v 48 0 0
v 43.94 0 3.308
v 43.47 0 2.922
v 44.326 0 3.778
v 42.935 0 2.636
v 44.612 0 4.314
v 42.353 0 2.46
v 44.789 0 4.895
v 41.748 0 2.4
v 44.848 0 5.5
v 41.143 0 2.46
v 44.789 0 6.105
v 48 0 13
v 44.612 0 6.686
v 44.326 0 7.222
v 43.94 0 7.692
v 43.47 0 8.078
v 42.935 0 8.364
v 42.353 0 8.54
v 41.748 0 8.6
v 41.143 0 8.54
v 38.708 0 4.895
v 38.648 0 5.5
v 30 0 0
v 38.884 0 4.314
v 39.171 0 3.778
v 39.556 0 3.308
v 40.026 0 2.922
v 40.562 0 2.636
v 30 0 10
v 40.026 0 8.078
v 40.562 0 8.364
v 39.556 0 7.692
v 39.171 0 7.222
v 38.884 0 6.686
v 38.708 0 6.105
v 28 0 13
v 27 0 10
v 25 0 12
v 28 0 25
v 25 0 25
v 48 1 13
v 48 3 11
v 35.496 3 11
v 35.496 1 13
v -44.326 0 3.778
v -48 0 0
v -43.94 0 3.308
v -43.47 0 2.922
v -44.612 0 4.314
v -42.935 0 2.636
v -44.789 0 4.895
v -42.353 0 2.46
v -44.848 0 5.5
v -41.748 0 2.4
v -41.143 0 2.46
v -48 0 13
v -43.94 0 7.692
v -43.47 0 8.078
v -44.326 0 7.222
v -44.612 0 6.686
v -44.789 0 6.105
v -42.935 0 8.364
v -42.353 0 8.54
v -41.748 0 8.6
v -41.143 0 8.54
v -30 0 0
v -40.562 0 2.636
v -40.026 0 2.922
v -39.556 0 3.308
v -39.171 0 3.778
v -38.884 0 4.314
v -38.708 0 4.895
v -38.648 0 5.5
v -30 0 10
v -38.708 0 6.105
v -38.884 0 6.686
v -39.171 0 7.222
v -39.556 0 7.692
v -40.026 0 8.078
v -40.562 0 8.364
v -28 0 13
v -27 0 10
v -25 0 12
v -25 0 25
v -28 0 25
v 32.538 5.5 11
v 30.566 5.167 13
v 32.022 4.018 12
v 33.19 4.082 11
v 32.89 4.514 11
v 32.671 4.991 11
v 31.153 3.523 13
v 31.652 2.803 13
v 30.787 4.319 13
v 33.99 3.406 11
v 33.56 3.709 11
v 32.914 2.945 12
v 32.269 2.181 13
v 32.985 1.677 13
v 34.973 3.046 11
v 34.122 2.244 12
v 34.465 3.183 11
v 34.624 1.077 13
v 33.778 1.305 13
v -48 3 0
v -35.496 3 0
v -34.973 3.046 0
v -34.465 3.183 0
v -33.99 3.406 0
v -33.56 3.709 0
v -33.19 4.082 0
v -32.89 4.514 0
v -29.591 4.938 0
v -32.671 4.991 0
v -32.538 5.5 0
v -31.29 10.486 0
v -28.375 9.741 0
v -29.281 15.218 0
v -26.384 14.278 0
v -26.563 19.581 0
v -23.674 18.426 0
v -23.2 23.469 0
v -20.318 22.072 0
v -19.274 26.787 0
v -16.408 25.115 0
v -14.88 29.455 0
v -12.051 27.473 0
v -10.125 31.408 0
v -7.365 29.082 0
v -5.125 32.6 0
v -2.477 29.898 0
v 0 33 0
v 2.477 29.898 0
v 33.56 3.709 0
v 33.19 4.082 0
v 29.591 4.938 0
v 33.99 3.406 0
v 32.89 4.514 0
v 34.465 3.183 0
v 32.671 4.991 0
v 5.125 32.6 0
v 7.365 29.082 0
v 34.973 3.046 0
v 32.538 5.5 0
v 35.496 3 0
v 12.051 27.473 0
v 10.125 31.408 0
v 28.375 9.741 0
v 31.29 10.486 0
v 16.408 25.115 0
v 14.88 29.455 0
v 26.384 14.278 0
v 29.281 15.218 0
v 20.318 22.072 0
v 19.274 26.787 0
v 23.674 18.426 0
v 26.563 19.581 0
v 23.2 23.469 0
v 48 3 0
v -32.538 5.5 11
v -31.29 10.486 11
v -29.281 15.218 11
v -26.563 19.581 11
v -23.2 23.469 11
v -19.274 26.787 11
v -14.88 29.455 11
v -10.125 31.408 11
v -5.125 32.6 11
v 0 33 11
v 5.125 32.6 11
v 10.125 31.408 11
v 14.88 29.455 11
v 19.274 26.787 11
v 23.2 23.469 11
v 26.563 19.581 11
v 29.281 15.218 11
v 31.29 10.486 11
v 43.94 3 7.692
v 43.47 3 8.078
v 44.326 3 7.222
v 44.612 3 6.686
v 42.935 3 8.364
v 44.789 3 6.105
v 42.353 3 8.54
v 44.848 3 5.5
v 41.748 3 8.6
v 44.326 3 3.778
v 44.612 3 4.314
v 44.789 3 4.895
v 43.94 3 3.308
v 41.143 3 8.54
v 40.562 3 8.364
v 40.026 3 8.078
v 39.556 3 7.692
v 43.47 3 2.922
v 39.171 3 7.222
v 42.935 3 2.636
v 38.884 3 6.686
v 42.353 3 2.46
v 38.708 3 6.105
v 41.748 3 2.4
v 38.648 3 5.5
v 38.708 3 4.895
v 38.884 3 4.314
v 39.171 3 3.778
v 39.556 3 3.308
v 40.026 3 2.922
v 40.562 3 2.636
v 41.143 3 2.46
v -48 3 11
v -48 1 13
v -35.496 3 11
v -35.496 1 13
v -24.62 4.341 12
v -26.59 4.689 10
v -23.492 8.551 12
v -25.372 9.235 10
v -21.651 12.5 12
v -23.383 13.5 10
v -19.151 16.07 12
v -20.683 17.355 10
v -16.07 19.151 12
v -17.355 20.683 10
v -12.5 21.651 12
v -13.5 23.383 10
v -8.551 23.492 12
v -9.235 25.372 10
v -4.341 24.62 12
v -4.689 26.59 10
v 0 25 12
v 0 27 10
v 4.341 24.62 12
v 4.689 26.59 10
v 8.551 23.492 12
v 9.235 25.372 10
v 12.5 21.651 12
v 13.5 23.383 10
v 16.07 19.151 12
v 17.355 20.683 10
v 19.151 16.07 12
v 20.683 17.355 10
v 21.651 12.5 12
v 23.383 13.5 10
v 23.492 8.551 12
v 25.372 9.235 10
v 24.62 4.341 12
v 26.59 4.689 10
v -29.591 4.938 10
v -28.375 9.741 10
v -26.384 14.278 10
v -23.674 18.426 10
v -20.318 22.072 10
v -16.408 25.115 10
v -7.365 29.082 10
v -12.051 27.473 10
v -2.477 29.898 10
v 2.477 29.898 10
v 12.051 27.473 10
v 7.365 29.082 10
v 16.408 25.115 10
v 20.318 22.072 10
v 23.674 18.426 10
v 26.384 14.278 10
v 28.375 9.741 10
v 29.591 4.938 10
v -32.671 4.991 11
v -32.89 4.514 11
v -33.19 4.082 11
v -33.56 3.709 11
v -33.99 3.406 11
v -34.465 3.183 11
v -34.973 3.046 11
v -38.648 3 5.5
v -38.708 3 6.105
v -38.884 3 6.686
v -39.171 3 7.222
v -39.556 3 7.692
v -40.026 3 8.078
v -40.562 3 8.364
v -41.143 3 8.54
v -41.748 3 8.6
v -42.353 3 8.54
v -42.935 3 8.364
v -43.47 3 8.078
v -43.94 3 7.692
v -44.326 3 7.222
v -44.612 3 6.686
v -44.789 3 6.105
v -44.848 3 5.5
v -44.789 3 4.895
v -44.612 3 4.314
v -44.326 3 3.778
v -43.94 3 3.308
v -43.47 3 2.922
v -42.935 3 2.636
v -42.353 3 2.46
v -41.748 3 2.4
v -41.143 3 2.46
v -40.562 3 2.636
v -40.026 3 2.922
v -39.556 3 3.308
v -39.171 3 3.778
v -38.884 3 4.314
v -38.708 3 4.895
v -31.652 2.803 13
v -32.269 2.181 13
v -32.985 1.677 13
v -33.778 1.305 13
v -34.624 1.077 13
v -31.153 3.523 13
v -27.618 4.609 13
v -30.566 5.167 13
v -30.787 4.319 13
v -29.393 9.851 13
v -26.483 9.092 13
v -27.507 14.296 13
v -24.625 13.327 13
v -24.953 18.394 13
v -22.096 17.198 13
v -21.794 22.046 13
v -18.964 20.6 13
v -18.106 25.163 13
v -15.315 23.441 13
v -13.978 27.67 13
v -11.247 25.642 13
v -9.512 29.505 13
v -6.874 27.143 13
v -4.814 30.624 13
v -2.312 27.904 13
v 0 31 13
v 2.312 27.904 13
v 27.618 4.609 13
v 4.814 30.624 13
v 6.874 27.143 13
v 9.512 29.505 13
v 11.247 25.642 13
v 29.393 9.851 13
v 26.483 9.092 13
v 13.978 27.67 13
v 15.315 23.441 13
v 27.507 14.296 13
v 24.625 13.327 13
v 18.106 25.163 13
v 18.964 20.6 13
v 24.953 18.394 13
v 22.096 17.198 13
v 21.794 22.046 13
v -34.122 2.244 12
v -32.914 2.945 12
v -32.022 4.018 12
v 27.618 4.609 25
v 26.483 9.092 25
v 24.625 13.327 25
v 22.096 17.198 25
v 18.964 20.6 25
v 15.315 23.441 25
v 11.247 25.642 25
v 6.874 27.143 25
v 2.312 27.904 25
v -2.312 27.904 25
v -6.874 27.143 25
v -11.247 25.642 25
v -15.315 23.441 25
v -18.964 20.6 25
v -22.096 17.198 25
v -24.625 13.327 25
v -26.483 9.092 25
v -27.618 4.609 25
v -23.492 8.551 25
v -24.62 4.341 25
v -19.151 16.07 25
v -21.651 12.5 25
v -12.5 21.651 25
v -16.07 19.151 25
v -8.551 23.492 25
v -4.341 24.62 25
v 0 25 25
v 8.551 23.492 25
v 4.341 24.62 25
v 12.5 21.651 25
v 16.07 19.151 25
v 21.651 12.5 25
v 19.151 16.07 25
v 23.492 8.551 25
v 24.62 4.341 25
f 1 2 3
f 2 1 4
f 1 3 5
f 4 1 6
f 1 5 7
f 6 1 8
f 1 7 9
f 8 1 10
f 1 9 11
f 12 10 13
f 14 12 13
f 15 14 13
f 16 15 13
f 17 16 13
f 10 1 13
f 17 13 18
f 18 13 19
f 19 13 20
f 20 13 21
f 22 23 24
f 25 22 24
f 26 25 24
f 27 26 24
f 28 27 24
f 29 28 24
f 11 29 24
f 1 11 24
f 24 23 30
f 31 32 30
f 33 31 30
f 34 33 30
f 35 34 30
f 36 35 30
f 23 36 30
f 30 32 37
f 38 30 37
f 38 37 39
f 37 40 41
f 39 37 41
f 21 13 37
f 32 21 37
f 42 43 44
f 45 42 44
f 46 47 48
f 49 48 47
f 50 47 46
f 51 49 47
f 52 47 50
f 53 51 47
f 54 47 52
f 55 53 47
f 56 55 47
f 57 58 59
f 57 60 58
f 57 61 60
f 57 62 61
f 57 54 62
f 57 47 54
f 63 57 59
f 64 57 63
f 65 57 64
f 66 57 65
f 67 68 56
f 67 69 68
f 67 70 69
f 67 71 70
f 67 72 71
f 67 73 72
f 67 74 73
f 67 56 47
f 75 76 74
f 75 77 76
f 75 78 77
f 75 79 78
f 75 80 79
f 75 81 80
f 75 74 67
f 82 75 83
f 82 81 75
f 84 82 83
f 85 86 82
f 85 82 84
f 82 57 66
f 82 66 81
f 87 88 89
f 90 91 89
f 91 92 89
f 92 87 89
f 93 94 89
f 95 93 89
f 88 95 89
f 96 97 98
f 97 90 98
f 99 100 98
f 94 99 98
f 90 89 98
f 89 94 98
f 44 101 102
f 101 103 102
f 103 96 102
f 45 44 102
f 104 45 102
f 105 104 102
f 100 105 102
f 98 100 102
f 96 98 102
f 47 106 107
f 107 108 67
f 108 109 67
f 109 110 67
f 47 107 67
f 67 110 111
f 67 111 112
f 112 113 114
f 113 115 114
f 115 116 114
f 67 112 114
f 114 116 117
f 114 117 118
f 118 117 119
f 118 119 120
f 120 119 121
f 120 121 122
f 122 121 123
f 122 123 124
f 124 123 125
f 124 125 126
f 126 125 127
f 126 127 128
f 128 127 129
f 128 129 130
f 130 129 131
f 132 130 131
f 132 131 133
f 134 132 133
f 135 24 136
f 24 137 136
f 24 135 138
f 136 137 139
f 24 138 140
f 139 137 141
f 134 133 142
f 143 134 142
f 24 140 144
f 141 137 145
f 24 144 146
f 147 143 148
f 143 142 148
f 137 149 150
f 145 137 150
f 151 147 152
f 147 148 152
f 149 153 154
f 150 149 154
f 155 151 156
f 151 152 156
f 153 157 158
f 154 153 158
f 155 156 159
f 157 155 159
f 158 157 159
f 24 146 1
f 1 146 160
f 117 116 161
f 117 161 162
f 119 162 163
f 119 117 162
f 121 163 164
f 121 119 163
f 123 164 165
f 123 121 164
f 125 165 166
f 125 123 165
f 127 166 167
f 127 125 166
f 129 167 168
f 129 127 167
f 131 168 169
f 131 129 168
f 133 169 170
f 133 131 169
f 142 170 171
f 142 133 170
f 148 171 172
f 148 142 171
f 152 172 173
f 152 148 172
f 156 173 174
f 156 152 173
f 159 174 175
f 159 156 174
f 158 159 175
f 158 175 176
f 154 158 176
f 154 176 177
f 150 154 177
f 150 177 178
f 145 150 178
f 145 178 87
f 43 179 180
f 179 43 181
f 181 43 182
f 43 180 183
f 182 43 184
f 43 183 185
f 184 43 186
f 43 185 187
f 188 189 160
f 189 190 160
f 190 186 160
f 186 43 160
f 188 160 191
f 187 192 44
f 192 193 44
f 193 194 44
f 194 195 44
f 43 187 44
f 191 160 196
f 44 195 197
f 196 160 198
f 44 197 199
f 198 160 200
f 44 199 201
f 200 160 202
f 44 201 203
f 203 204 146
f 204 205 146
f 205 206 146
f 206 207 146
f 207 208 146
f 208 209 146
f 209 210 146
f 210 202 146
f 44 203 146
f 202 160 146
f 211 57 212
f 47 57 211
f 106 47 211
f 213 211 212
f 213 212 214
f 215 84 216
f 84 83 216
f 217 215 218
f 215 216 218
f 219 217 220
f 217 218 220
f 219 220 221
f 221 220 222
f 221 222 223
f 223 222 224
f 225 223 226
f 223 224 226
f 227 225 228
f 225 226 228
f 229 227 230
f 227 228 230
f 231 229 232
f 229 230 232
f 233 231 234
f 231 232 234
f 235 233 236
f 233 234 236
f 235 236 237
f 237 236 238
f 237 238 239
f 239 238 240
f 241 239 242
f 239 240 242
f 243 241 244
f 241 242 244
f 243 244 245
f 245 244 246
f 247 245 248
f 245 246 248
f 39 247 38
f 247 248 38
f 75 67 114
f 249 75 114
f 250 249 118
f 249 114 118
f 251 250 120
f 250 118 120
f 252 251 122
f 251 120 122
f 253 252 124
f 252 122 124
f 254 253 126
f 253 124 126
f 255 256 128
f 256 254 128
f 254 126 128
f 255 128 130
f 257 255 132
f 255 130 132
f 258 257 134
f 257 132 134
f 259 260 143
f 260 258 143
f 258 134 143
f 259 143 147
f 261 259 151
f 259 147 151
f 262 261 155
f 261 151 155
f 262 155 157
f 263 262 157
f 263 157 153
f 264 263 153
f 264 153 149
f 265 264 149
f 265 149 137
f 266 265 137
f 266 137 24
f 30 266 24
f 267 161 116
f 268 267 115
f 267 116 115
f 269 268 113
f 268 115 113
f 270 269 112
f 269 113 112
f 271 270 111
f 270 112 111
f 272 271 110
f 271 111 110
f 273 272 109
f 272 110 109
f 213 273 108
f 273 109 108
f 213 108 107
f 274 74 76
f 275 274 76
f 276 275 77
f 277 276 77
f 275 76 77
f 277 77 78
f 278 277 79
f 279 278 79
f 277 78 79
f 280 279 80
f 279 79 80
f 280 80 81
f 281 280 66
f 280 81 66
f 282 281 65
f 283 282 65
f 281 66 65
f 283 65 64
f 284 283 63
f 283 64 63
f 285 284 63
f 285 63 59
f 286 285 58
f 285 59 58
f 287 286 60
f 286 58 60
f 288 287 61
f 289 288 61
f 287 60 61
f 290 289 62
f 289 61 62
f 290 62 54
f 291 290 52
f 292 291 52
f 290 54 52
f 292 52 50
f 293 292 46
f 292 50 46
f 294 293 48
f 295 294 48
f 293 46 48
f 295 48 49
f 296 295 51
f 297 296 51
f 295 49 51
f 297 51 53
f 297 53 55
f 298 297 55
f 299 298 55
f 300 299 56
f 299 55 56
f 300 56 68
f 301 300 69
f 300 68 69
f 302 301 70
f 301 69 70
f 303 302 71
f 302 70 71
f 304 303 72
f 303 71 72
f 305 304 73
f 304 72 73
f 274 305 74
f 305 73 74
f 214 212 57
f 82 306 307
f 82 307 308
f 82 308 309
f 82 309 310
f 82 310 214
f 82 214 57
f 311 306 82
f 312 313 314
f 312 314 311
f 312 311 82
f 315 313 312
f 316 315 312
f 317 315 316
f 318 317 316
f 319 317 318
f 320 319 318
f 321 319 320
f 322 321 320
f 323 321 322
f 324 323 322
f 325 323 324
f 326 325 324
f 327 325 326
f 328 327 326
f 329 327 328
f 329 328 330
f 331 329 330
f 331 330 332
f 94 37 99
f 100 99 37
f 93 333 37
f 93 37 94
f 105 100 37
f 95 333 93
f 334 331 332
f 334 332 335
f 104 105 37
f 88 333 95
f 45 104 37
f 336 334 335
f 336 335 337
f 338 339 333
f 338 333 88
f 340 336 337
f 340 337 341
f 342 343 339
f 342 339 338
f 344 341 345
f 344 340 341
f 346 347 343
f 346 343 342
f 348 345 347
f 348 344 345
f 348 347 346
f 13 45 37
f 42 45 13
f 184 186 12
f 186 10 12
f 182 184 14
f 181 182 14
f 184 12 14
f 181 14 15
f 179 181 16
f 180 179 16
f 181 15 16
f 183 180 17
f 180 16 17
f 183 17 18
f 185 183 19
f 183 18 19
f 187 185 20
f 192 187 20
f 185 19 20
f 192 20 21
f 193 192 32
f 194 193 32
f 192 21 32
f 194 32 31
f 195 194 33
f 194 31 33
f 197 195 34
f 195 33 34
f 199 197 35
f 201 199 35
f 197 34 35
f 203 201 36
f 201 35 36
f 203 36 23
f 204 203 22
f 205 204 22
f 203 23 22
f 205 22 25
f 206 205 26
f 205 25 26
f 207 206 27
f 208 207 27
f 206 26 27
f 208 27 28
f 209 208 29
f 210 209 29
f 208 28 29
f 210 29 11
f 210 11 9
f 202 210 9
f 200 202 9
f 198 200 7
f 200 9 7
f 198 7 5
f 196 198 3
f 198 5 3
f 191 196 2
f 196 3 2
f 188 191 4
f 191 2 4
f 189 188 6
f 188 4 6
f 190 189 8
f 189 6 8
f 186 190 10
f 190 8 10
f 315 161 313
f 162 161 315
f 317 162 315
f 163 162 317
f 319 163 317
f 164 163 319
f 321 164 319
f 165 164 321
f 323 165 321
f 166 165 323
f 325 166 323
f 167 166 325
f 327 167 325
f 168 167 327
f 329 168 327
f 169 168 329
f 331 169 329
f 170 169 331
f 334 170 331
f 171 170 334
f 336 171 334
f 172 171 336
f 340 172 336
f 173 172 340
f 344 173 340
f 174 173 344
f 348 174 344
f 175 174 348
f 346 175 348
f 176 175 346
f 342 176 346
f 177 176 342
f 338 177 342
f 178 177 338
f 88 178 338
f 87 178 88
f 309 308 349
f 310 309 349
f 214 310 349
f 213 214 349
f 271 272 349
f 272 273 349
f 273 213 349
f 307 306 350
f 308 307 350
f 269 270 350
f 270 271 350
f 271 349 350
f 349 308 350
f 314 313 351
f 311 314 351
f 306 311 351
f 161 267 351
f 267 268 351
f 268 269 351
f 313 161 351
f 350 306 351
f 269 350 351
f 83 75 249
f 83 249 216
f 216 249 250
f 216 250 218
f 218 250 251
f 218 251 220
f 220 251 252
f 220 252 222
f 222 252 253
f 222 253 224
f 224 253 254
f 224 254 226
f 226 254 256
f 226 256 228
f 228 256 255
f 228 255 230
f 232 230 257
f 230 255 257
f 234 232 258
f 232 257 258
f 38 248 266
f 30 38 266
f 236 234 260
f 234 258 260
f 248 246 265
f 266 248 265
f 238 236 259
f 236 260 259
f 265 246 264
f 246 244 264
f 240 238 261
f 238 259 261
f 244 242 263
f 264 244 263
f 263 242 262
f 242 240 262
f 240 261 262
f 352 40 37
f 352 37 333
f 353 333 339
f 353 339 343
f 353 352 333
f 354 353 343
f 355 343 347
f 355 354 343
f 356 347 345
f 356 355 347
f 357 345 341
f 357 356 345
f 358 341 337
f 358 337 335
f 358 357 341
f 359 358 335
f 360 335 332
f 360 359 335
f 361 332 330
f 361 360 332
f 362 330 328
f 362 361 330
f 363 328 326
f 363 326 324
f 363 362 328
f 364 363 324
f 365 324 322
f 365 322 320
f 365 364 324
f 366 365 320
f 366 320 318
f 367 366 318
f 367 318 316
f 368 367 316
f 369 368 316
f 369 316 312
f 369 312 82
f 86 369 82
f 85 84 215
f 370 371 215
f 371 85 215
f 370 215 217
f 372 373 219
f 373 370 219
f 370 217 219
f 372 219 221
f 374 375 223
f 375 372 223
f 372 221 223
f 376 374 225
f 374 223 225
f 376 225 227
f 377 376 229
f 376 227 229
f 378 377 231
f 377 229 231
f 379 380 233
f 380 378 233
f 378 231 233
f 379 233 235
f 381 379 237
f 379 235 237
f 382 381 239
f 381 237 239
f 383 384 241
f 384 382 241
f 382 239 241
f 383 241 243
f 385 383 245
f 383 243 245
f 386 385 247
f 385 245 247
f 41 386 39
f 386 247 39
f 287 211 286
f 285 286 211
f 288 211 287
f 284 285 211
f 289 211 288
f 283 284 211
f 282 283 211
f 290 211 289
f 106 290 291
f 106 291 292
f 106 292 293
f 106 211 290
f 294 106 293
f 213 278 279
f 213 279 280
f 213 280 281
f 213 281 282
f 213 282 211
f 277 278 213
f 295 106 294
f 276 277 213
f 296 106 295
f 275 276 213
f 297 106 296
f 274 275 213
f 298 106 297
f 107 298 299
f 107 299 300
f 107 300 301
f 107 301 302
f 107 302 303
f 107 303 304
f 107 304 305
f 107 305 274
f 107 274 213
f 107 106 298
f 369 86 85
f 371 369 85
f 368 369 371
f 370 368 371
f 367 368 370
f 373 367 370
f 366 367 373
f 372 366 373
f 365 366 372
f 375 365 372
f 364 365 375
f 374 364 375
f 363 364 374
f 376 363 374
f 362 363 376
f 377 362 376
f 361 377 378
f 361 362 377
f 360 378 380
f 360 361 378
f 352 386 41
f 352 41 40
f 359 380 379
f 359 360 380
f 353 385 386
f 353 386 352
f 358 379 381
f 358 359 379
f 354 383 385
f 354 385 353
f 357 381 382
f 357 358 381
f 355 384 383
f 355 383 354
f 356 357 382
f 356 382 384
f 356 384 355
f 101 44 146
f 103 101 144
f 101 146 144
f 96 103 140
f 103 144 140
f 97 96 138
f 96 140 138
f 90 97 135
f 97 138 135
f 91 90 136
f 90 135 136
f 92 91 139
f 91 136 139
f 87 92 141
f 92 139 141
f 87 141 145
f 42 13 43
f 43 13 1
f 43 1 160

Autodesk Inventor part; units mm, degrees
ref_plane "YZ Plane" through (0, 0, 0) normal (1, 0, 0) x (0, 1, 0)
ref_plane "XZ Plane" through (0, 0, 0) normal (0, 1, 0) x (-1, 0, 0)
ref_plane "XY Plane" through (0, 0, 0) normal (0, 0, 1) x (1, 0, 0)
sketch "Sketch1" plane through (0, 0, 0) normal (0, 0, 1) x (1, 0, 0)
  circle A0 centre (0, 0) radius 30
  line L0 (-33, 0) -> (-48, 0)
  line L1 (-48, 0) -> (-48, 3)
  line L2 (-48, 3) -> (-35.4965, 3)
  arc A1 (-35.4965, 3) -> (-32.5384, 5.5) centre (-35.4965, 6) ccw
  line L3 (0, 35.372) -> (0, -34.8897)
  line L4 (33, 0) -> (48, 0)
  line L5 (48, 0) -> (48, 3)
  line L6 (48, 3) -> (35.4965, 3)
  arc A2 (32.5384, 5.5) -> (35.4965, 3) centre (35.4965, 6) ccw
  arc A3 (-33, 0) -> (33, 0) centre (0, 0) ccw
  arc A4 (32.5384, 5.5) -> (-32.5384, 5.5) centre (0, 0) ccw
  line L7 (33, 0) -> (30, 0)
  line L8 (-33, 0) -> (-30, 0)
  point P0 (-32.8634, 3)
  dimension "d0" = 60
  dimension "d4" = 15
  dimension "d5" = 3
  dimension "d6" = 3
extrude "Extrusion1" add sketch "Sketch1" along normal blind 13 contours A0 L3 A4 A2 L6 L5 L4 L7 | A0 L8 L0 L1 L2 A1 A4 L3
sketch "Sketch2" plane through (0, 0, 0) normal (0, 1, 0) x (-1, 0, 0)
  line L0 (-30, 0) -> (-30, 13) construction
  line L1 (-30, 0) -> (-33, 0) construction
  line L2 (-30, 0) -> (-48, 0) construction
  line L3 (-33, 0) -> (-33, 13) construction
  line L4 (-33, 13) -> (-28, 13) construction
  line L5 (-35.4965, 13) -> (-32.5384, 13) construction
  line L6 (-30, 13) -> (-28, 13)
  line L7 (-28, 13) -> (-28, 25)
  line L8 (-28, 25) -> (-25, 25)
  line L9 (-25, 25) -> (-25, 12)
  line L10 (-27, 10) -> (-30, 10)
  line L11 (-27, 10) -> (-25, 12)
  line L12 (-30, 10) -> (-30, 13)
  line L13 (0, -5) -> (0, 30) projected
  point P0 (0, 0)
  point P1 (-25, 10)
  dimension "d9" = 3
  dimension "d10" = 5
  dimension "d11" = 12
  dimension "d12" = 3
  dimension "d13" = 15
  dimension "d14" = 2
  dimension "d15" = 2
revolve "Revolution1" add sketch "Sketch2" angle 180 about axis through (0, 0, -10) along (0, 0, 1)
chamfer "Chamfer1" distance 2 angle 45 5 edges at (0, 33, 13) (-33.56, 3.7087, 13) (-41.7482, 3, 13) (33.56, 3.7087, 13) (41.7482, 3, 13)
sketch "Sketch3" plane through (-48, 0, 0) normal (0, -1, 0) x (1, 0, 0)
  line L0 (0, 0) -> (0, 13) construction
  line L1 (48, 0) -> (48, 25)
  line L2 (73, 25) -> (23, 25) projected
  line L3 (12.5035, 0) -> (0, 0) projected
  line L4 (6.2518, 0) -> (6.2518, 5.5) construction
  circle A0 centre (6.2518, 5.5) radius 3.1
  circle A1 centre (89.7482, 5.5) radius 3.1
  line L5 (0, 0) -> (0, 5.5) construction
  line L6 (0, 5.5) -> (6.2518, 5.5) construction
  dimension "d24" = 6.2
  dimension "d25" = 5.5
extrude "Extrusion2" cut sketch "Sketch3" against normal through all
equation "\"d15\" = d14"
properties part number "EXTRUSSOR-COUPLINGv2"
